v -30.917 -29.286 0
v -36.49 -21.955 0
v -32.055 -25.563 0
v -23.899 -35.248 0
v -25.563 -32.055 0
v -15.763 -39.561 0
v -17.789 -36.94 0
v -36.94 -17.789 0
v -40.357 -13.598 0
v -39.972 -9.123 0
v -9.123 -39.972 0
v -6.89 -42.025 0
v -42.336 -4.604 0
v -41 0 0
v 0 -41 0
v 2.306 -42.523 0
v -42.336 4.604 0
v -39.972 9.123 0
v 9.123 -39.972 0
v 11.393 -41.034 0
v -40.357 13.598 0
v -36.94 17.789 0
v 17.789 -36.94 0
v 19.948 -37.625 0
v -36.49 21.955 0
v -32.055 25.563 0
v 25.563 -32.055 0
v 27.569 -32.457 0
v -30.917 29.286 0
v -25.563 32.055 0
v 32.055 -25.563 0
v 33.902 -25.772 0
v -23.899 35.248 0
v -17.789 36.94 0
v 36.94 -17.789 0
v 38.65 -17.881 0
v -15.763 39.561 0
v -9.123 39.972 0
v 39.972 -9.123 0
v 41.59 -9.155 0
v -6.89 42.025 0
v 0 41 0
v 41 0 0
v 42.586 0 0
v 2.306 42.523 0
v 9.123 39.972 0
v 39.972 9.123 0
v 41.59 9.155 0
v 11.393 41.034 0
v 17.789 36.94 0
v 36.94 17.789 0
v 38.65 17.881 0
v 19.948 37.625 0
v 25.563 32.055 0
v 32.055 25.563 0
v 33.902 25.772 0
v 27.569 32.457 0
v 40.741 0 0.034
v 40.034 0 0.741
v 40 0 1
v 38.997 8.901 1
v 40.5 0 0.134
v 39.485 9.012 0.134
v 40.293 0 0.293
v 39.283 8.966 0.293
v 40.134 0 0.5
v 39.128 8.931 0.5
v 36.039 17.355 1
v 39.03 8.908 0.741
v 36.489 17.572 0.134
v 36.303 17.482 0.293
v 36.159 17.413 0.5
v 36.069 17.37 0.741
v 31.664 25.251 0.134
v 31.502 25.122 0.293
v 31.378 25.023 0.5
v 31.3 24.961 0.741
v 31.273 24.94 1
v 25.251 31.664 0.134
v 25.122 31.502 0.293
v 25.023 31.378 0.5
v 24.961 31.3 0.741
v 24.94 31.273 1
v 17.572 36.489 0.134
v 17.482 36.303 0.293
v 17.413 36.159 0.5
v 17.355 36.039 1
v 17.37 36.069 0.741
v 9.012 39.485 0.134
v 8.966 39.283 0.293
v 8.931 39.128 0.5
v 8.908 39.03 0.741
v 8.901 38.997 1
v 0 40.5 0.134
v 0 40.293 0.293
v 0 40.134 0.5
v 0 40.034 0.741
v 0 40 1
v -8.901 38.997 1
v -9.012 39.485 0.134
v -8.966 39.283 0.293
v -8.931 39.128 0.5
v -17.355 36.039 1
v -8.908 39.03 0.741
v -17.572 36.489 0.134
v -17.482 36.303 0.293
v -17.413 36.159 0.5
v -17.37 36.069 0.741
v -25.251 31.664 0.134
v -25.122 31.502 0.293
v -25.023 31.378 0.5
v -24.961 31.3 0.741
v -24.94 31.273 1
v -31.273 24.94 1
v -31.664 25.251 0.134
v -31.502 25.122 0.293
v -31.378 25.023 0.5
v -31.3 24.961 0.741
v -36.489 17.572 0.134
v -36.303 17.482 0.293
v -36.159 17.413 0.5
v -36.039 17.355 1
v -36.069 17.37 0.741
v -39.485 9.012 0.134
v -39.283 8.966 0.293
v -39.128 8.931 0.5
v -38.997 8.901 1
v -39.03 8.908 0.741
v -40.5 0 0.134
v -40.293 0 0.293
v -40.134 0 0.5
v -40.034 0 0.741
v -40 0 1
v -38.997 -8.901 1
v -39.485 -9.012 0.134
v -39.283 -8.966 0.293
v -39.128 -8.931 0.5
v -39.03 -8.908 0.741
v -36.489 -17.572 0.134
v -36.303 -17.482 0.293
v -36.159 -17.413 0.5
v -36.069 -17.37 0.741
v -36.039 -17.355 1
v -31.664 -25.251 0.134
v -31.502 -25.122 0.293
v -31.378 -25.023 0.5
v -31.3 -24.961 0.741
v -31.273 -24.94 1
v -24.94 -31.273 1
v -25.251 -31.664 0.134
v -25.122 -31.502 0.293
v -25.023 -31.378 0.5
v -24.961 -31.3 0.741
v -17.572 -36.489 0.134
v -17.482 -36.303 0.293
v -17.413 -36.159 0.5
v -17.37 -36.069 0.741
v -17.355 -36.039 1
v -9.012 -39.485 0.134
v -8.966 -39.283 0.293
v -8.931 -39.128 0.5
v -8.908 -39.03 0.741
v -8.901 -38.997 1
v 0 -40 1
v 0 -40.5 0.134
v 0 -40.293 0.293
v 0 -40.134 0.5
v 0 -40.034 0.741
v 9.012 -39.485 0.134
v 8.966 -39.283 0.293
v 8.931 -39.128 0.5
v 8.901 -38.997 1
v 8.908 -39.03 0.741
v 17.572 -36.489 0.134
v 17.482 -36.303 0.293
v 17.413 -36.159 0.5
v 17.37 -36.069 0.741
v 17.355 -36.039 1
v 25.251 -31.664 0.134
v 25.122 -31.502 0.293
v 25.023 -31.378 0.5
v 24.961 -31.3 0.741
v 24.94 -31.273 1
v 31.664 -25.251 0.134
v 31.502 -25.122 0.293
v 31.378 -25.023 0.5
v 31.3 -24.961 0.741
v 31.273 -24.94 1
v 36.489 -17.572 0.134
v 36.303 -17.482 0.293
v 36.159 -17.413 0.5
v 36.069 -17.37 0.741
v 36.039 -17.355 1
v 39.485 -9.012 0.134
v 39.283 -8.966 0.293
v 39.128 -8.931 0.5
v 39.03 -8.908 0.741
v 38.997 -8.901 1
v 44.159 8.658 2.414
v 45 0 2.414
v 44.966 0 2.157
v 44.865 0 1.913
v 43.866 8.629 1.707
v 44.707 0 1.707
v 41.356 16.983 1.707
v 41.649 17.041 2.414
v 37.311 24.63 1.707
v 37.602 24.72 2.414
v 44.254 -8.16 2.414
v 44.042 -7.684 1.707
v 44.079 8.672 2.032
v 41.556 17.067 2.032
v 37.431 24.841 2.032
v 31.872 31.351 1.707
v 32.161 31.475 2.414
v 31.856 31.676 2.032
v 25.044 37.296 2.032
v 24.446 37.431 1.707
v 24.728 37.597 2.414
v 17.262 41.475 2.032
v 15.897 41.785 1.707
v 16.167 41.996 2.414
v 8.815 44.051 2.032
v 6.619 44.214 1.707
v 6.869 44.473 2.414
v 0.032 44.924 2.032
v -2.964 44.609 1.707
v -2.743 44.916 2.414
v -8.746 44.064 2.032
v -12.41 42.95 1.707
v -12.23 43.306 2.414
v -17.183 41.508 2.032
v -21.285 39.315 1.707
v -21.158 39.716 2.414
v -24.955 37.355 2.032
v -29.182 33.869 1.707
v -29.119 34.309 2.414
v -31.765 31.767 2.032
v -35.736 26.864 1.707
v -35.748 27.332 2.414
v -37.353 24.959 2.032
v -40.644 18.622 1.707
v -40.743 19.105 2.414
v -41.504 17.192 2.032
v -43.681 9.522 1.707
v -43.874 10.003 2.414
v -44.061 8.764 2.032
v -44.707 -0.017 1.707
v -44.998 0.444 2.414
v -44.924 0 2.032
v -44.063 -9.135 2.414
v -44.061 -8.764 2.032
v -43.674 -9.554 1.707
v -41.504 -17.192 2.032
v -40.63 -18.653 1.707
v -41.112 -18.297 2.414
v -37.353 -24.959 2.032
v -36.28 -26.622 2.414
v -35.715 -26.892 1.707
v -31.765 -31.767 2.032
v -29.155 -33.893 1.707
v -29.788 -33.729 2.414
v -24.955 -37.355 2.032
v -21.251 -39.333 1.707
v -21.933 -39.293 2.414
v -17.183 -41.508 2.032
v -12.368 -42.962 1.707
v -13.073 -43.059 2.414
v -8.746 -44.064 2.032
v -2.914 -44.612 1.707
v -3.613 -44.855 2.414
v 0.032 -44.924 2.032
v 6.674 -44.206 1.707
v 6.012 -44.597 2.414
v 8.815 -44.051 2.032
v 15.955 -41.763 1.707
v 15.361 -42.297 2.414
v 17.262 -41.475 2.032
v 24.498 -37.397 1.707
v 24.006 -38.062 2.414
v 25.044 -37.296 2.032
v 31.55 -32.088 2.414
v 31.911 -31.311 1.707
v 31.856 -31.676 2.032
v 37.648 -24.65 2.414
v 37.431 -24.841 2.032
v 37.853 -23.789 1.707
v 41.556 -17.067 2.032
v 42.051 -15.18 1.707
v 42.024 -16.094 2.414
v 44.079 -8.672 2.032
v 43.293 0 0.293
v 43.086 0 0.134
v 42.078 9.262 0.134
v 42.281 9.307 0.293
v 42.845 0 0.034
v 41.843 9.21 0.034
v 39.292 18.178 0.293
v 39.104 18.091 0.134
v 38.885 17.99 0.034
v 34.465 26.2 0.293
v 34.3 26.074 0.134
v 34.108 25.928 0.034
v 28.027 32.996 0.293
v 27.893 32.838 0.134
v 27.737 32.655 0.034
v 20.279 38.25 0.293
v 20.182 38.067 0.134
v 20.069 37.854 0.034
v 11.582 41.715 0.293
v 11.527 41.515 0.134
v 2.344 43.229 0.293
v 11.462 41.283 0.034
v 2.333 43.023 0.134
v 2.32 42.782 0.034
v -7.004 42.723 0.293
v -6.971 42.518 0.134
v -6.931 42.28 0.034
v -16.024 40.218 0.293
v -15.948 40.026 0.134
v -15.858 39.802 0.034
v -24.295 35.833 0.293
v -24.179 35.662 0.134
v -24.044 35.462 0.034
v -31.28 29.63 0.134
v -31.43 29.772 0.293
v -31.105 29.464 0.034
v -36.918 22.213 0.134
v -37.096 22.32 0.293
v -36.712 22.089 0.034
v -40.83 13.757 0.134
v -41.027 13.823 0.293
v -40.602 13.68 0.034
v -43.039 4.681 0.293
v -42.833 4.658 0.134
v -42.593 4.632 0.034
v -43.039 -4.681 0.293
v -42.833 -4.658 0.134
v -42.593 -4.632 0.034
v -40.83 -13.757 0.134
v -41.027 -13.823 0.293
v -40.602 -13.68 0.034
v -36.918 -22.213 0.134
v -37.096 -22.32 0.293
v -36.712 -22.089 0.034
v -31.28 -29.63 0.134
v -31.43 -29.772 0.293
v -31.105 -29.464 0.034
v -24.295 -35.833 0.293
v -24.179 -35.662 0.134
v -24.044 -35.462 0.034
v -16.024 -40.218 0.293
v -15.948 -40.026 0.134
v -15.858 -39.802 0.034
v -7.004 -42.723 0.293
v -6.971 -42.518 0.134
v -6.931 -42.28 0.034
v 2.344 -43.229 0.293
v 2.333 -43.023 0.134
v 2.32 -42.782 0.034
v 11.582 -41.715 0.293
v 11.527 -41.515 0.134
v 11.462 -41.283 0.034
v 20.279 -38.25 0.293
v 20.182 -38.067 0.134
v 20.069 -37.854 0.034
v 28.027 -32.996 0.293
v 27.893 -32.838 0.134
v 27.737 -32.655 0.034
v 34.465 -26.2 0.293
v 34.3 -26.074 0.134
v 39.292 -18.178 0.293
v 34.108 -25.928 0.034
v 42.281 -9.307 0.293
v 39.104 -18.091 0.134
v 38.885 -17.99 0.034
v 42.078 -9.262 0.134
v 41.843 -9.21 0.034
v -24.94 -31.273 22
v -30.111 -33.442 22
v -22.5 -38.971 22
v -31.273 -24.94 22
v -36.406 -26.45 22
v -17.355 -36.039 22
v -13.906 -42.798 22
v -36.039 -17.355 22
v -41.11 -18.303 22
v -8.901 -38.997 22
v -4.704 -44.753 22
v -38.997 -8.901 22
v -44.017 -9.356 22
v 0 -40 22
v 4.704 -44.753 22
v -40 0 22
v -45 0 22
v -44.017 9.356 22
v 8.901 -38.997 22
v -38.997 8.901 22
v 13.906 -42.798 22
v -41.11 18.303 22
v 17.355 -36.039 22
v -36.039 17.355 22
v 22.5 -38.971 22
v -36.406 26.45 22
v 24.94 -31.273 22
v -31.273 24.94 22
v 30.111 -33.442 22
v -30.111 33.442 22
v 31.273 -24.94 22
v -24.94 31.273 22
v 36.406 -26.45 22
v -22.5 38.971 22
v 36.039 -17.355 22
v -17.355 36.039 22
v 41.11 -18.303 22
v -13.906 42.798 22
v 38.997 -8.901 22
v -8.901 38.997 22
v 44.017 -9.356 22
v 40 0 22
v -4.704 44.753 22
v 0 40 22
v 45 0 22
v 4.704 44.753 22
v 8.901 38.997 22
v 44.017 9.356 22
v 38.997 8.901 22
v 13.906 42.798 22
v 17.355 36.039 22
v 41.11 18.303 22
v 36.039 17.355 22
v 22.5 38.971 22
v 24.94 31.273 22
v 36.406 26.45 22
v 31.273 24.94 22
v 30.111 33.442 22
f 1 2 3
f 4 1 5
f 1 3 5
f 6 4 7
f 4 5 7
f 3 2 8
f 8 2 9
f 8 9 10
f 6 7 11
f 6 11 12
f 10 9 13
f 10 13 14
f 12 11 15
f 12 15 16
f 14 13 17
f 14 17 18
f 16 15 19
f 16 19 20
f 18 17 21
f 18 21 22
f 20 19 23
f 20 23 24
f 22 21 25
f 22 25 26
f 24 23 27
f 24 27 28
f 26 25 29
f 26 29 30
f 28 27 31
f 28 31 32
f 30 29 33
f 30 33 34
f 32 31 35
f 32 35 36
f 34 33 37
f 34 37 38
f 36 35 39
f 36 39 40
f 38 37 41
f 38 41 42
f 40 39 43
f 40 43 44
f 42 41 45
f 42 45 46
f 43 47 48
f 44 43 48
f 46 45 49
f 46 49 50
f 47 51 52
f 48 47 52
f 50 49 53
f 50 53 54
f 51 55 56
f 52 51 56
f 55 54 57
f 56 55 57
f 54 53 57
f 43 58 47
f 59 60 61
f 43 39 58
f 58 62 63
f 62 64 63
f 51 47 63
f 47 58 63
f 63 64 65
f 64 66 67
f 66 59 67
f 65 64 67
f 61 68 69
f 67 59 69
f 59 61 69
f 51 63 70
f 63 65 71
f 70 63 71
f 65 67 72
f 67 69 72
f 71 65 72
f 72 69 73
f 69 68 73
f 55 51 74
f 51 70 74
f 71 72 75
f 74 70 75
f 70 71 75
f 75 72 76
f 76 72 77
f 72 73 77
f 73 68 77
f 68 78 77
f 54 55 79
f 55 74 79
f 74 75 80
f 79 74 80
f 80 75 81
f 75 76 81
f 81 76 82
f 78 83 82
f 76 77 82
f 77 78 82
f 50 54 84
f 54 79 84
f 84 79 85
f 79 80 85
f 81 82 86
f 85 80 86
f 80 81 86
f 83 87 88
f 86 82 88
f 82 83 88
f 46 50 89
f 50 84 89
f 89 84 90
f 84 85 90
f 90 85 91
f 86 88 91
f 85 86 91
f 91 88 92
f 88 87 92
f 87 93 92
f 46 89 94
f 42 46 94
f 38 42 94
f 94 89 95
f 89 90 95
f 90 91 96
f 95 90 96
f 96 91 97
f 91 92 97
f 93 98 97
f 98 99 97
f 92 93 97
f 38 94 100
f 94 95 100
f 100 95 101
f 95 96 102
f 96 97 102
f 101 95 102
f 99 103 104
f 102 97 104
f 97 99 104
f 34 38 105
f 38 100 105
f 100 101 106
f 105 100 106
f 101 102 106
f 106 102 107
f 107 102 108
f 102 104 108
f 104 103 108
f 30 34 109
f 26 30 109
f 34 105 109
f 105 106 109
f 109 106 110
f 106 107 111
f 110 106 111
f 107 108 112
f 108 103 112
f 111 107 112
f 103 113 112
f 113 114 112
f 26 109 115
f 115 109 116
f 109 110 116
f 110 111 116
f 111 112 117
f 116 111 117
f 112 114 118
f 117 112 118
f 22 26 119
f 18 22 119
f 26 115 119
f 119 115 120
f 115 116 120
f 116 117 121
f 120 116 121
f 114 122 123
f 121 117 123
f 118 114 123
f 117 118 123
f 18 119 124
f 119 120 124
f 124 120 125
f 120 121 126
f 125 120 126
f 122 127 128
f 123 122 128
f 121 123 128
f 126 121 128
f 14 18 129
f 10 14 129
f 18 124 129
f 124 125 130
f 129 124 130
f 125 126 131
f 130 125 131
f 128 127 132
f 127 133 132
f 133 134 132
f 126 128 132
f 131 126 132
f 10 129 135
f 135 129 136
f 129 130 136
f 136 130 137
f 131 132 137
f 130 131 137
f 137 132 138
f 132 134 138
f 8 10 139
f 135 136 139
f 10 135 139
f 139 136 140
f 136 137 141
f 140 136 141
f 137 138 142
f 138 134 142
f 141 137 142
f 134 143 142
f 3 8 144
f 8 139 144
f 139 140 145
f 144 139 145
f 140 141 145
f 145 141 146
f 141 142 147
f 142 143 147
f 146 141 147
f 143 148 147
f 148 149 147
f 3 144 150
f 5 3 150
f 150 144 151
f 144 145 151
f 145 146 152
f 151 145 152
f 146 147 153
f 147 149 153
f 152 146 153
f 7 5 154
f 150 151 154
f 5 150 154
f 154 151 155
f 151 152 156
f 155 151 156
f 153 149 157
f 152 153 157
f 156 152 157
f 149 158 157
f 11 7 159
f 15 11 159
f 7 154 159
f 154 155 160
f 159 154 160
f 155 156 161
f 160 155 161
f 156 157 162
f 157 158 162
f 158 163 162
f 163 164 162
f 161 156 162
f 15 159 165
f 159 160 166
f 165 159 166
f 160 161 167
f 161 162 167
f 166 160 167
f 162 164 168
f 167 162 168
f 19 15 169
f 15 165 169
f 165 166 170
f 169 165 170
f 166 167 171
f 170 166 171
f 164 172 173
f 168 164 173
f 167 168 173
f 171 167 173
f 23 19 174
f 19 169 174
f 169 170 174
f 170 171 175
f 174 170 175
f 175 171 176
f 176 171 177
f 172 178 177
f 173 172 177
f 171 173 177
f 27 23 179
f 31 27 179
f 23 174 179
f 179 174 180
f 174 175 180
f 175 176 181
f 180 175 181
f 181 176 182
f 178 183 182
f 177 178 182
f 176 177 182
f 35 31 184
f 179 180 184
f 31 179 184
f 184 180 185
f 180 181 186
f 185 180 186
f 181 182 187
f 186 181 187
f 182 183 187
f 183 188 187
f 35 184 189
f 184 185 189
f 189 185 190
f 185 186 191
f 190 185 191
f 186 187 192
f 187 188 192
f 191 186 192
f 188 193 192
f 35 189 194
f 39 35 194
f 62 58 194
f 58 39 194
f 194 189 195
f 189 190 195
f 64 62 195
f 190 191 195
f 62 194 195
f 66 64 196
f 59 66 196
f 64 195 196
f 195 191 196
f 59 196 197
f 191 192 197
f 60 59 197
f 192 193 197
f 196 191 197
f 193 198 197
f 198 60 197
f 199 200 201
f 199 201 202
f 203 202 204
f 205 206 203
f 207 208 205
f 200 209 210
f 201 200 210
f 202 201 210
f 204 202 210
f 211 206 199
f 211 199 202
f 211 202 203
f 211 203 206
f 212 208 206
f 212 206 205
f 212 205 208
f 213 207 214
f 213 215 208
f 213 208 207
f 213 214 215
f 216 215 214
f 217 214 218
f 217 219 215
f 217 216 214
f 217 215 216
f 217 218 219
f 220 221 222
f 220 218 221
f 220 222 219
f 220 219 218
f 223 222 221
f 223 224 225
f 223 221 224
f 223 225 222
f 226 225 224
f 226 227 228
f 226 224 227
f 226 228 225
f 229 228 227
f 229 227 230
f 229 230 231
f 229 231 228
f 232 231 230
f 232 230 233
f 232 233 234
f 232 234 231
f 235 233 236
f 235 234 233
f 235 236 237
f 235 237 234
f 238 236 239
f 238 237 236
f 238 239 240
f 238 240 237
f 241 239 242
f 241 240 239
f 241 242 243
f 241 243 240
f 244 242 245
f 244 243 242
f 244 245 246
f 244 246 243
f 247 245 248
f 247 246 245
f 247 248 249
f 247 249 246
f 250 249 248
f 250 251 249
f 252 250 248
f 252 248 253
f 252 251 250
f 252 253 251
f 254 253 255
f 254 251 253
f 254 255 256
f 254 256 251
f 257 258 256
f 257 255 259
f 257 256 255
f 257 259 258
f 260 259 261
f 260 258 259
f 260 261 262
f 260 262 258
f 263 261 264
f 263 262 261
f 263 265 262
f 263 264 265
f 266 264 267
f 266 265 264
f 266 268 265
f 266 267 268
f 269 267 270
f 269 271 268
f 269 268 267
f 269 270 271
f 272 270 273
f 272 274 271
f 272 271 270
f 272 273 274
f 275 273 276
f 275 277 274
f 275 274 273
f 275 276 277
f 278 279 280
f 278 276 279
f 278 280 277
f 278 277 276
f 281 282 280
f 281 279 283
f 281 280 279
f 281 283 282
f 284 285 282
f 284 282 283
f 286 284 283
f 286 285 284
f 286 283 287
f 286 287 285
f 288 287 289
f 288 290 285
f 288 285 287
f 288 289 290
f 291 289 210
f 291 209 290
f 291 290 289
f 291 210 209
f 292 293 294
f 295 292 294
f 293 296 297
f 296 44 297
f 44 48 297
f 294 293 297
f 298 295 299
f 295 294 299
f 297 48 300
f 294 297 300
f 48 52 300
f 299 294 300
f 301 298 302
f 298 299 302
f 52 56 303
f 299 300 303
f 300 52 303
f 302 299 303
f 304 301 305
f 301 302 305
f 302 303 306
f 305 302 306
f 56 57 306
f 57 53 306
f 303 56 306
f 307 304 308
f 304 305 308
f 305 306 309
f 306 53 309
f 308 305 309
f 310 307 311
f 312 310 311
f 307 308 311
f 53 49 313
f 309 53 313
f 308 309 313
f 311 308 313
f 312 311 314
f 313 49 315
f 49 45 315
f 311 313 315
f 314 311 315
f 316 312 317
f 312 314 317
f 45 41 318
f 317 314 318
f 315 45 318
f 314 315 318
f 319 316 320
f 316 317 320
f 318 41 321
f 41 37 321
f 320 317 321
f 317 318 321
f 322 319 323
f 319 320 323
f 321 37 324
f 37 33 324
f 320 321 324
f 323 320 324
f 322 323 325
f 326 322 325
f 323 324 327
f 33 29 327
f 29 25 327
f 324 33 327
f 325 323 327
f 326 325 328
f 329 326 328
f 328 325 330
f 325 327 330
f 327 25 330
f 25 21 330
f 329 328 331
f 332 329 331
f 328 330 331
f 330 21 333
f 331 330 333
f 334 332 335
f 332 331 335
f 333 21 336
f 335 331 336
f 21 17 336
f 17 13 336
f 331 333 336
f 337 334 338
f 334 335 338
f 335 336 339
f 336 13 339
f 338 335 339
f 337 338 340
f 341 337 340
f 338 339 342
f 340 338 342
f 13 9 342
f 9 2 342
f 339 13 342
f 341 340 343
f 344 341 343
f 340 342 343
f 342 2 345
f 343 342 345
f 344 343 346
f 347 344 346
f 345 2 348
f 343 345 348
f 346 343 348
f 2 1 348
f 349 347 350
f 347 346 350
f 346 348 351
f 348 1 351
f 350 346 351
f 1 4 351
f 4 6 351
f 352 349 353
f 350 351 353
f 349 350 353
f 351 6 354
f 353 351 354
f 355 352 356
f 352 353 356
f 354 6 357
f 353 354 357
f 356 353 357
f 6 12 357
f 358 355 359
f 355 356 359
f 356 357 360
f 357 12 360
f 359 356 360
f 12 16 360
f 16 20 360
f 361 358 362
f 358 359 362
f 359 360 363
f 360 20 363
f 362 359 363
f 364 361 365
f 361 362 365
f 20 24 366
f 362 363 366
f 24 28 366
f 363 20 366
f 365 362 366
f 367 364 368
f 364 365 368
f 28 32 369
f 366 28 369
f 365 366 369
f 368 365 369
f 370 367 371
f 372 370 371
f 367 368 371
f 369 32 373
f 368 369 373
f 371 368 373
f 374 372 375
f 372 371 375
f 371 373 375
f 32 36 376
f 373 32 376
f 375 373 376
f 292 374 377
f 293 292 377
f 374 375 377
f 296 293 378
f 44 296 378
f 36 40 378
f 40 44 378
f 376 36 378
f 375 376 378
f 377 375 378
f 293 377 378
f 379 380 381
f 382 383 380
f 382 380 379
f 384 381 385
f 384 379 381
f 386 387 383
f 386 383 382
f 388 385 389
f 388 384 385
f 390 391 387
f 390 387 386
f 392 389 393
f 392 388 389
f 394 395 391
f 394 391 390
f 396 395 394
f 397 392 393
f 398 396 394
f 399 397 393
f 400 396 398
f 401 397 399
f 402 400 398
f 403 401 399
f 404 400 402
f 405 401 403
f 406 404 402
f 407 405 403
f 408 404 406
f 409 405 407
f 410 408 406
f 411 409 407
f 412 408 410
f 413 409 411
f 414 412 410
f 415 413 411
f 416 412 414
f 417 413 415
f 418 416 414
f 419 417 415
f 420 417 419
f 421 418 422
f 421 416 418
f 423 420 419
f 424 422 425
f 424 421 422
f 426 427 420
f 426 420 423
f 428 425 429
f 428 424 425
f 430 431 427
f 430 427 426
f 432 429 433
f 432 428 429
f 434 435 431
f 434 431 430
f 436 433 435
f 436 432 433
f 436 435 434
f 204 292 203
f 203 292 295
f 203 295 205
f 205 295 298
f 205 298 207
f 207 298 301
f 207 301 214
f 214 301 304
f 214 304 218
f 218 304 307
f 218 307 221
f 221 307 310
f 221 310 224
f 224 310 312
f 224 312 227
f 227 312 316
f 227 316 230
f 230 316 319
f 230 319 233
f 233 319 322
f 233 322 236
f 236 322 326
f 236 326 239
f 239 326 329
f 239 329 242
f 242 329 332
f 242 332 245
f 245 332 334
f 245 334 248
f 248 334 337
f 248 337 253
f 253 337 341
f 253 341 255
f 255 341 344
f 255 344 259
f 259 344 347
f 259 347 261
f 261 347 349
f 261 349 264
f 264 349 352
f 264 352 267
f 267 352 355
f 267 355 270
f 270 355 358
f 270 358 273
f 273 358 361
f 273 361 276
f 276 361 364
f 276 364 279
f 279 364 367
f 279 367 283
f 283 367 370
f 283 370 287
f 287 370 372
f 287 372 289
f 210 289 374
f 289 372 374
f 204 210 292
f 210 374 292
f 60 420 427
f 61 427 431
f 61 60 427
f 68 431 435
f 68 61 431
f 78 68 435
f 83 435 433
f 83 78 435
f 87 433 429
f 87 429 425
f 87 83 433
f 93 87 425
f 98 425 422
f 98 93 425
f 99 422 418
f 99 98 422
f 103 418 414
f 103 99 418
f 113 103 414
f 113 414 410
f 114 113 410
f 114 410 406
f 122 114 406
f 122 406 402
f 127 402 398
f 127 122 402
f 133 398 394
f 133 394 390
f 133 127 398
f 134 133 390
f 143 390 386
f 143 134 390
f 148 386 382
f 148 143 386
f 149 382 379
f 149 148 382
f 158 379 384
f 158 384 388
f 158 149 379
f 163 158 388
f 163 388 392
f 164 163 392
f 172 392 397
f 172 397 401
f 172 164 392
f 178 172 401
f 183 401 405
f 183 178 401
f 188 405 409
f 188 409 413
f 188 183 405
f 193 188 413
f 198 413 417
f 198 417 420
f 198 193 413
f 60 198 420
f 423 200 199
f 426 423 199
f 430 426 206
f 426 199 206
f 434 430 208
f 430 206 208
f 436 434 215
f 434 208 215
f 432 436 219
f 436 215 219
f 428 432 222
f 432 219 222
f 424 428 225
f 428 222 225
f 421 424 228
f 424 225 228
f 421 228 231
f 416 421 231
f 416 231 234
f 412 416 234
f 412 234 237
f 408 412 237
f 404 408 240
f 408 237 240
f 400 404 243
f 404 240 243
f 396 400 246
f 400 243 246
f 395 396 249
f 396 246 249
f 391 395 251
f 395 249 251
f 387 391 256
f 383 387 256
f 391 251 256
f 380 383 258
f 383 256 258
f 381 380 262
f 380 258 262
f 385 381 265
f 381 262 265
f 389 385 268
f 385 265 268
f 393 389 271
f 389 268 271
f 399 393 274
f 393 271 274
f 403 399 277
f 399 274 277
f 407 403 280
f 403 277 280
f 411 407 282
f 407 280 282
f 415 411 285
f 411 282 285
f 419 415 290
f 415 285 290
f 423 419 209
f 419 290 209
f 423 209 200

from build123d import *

# Parameters (mm, degrees)
SKETCH1_R           = 45
SKETCH1_R_2         = 40
BOSS_EXTRUDE1_DEPTH = 22
CHAMFER1_SIZE       = 2
FILLET1_R           = 1


with BuildPart() as part:
    # Sketch1 → Boss-Extrude1 (new body)
    with BuildSketch(Plane.XY):
        Circle(SKETCH1_R)
        Circle(SKETCH1_R_2, mode=Mode.SUBTRACT)
    extrude(amount=BOSS_EXTRUDE1_DEPTH)

    # Chamfer1
    chamfer1_edges = [part.edges().sort_by_distance(p)[0] for p in [
        (-45, 0, 0),
    ]]
    chamfer(chamfer1_edges, length=CHAMFER1_SIZE)

    # Fillet1
    fillet1_edges = [part.edges().sort_by_distance(p)[0] for p in [
        (-45, 0, 2),
        (-43, 0, 0),
        (-40, 0, 0),
    ]]
    fillet(fillet1_edges, radius=FILLET1_R)


solid = part.part
